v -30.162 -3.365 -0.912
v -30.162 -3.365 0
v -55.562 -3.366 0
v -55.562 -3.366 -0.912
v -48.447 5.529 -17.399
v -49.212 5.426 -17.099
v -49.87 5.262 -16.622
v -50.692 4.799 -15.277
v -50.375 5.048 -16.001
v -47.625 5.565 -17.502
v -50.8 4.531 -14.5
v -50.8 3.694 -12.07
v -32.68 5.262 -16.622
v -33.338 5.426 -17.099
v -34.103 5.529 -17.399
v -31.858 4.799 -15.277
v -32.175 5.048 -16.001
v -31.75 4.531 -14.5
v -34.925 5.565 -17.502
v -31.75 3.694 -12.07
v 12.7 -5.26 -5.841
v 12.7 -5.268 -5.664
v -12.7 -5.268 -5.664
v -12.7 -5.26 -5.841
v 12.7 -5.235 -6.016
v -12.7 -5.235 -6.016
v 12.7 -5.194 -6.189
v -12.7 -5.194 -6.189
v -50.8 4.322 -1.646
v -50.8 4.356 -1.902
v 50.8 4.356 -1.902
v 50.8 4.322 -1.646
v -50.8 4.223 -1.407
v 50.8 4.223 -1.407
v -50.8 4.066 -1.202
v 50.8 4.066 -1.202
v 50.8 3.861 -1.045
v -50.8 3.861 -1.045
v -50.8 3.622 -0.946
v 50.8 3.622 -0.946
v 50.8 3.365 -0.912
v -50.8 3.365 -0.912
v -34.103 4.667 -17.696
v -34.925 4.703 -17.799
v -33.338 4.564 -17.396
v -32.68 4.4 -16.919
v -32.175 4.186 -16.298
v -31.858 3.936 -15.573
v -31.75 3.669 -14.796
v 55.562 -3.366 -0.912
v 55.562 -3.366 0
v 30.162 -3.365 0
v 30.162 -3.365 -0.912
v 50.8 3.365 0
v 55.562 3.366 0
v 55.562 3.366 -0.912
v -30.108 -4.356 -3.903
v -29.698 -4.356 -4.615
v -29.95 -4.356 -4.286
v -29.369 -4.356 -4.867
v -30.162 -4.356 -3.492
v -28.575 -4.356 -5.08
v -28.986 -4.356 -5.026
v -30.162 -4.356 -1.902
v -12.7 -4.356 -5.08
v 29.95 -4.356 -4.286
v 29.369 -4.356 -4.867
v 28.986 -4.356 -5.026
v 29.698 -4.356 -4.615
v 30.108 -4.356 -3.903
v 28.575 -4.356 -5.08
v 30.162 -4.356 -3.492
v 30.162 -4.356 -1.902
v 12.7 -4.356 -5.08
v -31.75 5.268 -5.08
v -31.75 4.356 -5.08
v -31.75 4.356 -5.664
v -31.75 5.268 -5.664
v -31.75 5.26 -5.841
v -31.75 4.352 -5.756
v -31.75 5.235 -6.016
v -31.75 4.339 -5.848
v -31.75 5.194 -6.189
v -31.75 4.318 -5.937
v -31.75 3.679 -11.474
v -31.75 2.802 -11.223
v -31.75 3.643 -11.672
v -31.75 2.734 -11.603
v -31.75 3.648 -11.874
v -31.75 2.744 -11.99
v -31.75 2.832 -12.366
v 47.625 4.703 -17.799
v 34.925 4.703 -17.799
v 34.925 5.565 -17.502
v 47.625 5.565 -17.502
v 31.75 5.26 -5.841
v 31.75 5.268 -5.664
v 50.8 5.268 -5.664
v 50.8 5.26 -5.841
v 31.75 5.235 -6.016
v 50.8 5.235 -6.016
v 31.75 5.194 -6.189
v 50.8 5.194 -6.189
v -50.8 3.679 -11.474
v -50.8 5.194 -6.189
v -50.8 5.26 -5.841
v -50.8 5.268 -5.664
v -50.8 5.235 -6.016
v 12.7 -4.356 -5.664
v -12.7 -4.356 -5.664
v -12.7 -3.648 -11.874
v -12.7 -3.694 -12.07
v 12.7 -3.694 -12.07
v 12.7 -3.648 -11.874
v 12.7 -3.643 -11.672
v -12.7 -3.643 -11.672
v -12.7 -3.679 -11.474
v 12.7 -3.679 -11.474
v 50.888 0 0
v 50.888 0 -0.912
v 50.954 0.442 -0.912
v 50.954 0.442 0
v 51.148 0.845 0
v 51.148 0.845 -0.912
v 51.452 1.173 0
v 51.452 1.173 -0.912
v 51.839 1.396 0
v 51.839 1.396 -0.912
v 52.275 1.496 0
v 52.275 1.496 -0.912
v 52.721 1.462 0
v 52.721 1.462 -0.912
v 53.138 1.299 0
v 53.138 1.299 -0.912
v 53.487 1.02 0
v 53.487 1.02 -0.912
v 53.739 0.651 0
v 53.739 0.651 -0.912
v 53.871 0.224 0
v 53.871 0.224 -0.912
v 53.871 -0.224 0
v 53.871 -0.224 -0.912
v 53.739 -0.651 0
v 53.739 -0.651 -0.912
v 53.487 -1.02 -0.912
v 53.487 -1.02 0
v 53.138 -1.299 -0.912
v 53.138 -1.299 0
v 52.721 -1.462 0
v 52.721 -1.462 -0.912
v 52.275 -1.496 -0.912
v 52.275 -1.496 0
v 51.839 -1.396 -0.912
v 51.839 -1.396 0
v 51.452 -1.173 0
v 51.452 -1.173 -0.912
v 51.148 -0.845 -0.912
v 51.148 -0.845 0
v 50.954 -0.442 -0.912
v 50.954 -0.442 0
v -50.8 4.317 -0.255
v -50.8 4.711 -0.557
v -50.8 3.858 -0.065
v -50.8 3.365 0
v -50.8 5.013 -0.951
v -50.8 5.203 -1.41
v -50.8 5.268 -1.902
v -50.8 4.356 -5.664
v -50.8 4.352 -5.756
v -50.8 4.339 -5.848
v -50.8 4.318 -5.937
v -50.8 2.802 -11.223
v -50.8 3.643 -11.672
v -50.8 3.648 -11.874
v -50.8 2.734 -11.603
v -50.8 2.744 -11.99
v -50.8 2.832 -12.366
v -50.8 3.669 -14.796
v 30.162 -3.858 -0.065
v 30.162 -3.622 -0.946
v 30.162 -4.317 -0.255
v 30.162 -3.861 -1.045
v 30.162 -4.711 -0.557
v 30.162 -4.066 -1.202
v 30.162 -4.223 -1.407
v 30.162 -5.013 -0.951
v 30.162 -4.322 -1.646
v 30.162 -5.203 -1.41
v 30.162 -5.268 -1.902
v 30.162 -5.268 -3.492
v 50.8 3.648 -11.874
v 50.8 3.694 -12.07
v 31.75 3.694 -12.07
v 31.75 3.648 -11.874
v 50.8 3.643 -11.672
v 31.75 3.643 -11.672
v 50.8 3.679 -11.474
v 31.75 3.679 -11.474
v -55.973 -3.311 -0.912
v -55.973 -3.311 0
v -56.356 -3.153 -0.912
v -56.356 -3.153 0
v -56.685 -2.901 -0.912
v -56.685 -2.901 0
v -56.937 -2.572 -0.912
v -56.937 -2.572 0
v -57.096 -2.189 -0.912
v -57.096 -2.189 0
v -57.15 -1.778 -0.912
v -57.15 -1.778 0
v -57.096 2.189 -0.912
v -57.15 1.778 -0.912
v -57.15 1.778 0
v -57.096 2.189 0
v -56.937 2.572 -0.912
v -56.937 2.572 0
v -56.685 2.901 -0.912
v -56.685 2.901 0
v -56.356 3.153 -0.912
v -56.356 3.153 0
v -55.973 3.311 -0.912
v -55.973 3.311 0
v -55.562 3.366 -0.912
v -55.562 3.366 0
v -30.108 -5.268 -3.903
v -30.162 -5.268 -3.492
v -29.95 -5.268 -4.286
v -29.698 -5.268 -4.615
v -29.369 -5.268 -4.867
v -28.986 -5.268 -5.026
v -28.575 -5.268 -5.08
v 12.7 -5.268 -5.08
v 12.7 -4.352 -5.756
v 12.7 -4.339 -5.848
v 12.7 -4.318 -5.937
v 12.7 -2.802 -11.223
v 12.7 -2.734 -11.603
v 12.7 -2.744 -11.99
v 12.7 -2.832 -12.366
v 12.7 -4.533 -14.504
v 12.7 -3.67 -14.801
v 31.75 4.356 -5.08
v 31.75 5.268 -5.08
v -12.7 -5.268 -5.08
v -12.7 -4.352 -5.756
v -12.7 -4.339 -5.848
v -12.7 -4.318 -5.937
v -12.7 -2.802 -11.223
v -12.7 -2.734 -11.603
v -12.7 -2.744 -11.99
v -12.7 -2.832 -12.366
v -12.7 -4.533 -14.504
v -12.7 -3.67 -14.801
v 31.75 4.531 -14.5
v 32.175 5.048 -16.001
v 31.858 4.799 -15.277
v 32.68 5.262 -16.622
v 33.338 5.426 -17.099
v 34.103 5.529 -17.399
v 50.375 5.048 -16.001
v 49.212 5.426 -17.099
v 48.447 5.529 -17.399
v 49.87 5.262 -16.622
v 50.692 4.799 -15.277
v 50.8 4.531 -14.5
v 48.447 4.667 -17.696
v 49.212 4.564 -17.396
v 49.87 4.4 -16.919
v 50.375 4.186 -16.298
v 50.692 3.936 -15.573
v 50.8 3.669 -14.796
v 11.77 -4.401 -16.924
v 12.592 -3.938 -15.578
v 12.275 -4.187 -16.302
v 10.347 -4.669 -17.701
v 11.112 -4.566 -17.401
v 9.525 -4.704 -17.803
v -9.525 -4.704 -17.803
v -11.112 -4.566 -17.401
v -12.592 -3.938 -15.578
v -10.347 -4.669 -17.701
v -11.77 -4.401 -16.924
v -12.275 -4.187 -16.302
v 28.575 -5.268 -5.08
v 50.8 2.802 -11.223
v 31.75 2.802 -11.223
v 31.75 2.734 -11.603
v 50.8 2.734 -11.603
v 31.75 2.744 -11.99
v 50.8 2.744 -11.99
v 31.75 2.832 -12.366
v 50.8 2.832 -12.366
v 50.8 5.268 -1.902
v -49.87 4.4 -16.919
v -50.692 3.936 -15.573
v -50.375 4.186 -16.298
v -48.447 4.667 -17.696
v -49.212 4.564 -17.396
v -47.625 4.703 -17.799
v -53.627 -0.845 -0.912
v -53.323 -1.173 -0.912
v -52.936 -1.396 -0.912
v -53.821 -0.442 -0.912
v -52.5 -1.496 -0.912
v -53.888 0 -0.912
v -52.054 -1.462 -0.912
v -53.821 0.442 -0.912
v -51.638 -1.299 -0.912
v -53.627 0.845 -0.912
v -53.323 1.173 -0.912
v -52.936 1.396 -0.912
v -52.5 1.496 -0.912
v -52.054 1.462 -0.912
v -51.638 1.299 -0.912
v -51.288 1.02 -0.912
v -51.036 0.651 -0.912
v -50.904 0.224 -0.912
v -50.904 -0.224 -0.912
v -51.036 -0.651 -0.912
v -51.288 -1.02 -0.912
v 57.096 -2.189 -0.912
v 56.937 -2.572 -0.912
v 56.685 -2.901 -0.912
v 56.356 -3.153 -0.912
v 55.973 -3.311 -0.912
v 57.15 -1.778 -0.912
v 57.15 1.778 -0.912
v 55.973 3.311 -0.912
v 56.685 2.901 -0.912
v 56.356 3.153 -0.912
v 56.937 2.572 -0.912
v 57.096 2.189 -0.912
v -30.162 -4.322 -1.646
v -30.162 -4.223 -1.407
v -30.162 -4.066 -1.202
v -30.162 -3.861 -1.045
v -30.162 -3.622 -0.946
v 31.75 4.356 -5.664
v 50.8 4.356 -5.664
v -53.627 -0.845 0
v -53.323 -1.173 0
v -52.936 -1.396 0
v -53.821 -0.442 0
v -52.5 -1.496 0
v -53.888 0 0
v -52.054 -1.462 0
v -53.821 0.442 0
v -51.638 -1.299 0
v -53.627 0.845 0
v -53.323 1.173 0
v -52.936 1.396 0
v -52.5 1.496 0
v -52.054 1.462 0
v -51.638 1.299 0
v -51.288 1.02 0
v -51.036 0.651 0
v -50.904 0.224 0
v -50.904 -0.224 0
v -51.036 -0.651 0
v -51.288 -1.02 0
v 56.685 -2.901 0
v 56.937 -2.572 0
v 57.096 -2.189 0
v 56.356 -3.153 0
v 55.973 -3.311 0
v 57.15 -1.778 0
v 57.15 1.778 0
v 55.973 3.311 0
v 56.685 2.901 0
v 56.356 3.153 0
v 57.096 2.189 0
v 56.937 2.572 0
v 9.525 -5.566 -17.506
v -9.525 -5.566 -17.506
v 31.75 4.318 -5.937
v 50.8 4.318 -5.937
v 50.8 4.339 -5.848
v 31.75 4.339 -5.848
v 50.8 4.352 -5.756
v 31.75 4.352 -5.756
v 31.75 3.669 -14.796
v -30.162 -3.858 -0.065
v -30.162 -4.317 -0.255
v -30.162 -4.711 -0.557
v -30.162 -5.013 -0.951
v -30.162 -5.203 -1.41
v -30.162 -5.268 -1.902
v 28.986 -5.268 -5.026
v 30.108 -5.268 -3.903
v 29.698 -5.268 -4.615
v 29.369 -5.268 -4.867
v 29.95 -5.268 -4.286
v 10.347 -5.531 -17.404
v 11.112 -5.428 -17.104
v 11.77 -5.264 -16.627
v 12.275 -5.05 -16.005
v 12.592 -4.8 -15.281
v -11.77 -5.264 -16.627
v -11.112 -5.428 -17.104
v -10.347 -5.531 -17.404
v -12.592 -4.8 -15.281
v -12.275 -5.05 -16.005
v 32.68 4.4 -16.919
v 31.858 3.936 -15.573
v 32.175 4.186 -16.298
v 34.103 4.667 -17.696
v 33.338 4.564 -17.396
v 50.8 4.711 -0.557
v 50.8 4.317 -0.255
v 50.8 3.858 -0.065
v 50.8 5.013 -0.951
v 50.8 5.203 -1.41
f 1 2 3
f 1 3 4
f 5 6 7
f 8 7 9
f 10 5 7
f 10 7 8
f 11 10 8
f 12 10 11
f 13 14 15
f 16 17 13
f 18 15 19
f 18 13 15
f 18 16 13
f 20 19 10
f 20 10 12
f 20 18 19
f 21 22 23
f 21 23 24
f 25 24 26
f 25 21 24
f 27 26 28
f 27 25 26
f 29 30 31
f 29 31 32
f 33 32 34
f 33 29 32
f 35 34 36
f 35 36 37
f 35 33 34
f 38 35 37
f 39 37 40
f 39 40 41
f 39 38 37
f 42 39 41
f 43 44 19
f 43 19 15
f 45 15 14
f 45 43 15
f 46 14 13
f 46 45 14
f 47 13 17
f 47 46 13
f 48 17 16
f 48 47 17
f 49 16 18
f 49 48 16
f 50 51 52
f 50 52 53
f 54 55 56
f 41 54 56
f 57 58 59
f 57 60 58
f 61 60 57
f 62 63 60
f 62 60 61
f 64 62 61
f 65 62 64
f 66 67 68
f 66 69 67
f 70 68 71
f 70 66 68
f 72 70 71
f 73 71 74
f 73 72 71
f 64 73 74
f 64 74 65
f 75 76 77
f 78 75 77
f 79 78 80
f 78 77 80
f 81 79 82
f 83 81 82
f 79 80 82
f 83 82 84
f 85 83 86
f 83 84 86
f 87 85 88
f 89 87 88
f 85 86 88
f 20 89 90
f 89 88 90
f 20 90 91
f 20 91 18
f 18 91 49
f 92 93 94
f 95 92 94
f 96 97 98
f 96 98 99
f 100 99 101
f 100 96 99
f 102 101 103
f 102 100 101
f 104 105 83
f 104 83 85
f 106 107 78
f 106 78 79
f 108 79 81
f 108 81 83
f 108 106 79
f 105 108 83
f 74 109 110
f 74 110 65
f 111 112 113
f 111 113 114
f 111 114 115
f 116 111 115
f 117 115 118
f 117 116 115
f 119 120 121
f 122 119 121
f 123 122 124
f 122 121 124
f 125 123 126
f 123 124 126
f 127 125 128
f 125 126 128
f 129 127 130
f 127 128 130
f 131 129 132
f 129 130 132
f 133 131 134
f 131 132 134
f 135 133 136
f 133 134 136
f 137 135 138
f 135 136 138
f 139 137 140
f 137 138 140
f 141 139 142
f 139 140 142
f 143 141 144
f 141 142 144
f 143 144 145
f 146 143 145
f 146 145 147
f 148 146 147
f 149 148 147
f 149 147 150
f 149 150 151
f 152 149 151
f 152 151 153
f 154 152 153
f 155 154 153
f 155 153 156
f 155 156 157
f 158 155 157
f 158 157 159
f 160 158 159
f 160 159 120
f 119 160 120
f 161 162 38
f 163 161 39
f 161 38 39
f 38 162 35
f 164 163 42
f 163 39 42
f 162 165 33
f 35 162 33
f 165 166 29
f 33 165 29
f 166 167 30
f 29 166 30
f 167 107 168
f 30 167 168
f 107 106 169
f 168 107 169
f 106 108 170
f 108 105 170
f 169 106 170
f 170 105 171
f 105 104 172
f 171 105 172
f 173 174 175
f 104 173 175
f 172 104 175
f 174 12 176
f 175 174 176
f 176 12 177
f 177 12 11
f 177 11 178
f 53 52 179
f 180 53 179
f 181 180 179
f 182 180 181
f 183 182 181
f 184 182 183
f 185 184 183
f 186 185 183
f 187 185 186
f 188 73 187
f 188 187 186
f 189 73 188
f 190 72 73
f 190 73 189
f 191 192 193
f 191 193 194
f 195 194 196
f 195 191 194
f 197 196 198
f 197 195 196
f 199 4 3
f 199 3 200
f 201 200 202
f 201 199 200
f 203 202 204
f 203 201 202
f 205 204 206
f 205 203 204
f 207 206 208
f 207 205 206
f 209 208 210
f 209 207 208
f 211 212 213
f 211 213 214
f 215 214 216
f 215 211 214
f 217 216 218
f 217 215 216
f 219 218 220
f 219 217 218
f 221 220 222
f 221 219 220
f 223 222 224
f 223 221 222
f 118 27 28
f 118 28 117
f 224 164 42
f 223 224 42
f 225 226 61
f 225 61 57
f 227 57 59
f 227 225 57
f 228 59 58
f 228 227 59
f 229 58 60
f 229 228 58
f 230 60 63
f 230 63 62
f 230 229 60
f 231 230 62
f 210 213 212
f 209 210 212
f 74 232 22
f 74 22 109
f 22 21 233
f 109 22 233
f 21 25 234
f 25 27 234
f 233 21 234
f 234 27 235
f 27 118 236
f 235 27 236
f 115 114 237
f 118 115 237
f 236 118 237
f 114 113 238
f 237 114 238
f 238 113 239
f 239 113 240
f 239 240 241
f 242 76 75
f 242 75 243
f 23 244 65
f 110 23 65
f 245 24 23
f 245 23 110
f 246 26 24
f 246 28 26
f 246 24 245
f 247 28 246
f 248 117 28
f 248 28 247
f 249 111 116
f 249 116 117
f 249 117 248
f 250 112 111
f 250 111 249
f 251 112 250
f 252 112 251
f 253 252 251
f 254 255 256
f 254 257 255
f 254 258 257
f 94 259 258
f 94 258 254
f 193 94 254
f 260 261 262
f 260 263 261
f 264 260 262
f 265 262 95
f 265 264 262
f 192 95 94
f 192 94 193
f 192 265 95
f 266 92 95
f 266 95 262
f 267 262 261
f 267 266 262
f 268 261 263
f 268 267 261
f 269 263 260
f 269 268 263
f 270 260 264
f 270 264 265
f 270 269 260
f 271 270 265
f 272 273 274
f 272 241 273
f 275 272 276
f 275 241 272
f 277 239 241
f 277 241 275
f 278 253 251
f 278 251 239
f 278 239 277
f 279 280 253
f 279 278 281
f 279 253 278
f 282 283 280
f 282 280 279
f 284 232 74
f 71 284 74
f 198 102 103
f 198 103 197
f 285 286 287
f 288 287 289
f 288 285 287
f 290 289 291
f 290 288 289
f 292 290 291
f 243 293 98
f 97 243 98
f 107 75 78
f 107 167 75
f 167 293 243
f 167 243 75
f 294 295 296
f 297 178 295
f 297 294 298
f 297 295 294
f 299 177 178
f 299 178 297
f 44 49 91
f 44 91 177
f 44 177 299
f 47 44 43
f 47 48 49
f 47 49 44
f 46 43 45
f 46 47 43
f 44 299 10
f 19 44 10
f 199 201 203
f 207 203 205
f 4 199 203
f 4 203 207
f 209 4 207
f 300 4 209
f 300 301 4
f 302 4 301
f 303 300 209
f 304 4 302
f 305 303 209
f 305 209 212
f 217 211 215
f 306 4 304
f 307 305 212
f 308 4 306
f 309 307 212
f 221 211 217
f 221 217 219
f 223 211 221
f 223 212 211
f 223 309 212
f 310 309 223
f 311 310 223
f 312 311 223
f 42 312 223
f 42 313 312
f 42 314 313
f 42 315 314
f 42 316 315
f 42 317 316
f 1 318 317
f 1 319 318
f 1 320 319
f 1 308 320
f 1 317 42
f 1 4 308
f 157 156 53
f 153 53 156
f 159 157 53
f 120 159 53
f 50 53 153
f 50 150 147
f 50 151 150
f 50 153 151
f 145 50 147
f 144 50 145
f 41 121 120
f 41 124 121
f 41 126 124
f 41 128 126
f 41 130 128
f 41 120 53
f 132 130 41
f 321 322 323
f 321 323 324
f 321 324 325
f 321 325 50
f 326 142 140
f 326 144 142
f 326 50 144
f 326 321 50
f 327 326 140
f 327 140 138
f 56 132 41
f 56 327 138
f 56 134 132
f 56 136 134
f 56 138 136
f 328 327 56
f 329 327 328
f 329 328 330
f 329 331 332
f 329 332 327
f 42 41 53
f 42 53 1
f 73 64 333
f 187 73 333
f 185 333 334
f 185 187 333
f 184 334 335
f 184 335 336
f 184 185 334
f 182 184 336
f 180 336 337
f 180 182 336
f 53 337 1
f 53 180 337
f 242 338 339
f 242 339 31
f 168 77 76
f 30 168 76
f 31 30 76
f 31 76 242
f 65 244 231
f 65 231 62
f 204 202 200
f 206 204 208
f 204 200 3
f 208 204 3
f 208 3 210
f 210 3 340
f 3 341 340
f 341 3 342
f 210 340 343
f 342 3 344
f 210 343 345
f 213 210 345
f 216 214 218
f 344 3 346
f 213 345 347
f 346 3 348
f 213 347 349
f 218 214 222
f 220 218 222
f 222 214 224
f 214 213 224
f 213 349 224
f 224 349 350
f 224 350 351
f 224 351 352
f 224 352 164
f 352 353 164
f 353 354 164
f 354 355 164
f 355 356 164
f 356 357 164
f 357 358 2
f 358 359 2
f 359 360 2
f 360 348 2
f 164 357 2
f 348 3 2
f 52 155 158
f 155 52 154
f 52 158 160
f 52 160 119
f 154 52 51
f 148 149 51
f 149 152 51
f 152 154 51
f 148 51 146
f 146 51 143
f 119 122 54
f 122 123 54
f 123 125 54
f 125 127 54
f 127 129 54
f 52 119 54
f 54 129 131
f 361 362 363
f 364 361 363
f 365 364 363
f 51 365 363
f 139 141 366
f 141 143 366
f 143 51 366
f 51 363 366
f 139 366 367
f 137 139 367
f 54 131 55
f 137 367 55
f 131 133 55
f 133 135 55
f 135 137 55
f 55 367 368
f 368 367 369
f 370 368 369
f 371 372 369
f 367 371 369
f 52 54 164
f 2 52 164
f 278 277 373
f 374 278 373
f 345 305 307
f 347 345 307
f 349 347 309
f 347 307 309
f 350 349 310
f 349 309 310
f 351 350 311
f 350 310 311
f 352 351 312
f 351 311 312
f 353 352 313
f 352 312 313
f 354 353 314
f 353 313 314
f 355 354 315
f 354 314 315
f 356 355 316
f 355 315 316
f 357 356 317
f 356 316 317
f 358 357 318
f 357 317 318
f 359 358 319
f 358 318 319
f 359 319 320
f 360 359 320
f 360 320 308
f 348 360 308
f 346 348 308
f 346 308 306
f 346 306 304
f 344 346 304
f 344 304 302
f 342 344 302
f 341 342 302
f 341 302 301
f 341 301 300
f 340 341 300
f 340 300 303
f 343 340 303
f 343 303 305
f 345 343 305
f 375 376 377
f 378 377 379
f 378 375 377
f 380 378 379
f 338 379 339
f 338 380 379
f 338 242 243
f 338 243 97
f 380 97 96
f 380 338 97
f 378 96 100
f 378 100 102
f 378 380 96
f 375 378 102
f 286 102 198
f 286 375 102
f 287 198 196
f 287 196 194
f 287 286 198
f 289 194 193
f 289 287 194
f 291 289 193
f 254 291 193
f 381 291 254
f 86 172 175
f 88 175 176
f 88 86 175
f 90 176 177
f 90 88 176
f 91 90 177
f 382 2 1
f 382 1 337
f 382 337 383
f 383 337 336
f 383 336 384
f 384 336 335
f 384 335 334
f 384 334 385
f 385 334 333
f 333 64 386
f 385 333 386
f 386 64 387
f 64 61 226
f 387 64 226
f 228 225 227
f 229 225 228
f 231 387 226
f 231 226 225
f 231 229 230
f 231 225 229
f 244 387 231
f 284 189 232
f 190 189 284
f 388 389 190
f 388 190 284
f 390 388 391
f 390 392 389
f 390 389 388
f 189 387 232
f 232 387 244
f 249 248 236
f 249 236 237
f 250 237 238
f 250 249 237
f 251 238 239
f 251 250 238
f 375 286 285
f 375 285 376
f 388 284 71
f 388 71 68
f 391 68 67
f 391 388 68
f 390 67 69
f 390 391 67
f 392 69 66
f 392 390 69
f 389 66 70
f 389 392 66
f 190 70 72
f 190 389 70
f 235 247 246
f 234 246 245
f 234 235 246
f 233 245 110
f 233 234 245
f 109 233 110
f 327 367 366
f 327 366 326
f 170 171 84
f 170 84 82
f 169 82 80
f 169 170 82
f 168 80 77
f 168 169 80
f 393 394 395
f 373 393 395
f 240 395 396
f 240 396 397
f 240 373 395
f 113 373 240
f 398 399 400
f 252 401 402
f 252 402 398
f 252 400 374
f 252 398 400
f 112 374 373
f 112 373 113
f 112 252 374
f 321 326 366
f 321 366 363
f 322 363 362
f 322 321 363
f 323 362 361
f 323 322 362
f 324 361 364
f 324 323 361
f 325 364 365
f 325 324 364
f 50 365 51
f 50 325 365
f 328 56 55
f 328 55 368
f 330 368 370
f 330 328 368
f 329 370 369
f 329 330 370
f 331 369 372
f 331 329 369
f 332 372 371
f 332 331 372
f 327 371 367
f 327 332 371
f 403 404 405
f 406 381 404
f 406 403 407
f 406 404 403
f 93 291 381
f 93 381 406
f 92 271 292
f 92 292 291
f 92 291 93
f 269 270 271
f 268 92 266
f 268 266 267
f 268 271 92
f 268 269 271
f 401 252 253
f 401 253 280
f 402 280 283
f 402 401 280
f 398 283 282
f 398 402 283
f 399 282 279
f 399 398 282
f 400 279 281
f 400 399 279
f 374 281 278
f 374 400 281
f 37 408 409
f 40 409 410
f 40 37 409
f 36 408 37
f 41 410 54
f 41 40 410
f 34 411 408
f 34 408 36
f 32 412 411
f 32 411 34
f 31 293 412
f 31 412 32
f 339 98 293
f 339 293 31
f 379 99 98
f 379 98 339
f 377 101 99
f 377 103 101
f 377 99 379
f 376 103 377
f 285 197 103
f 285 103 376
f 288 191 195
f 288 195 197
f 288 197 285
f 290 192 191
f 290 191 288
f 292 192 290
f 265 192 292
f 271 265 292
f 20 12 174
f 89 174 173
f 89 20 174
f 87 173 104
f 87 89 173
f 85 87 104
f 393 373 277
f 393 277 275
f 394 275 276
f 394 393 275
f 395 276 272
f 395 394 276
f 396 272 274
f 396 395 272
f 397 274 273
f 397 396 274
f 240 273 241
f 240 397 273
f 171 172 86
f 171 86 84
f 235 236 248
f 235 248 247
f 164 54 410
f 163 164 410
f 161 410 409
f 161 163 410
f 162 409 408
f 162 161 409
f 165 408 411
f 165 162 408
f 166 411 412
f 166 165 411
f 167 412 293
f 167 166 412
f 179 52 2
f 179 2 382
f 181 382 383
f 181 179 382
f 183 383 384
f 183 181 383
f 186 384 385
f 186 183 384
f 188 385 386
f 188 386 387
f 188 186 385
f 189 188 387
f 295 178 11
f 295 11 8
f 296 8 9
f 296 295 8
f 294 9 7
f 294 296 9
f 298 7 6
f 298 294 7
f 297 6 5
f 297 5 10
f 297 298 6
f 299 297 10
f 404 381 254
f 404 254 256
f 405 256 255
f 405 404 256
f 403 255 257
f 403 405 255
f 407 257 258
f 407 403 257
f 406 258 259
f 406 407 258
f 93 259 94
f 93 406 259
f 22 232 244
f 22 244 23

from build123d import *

# Parameters (mm, degrees)
SKETCH1_W                                 = 0.91186
SKETCH1_H                                 = 6.731
BASE_FLANGE1_DEPTH                        = 57.15
EDGE_FLANGE1_DEPTH                        = 101.6
EDGE_FLANGE2_DEPTH                        = 101.6
EDGE_FLANGE3_DEPTH                        = 101.6
CUT_EXTRUDE1_START                        = -2.539504
SKETCH21_W                                = 63.5
SKETCH21_H                                = 12.718519465
CUT_EXTRUDE1_DEPTH                        = 2.836243
EDGE_FLANGE4_DEPTH                        = 60.325
EDGE_FLANGE5_DEPTH                        = 25.4
EDGE_FLANGE6_DEPTH                        = 25.4
BREAK_CORNER3_START                       = 0.436452344
BREAK_CORNER3_DEPTH                       = 0.91186
BREAK_CORNER3_START_2                     = -1.348312344
BREAK_CORNER3_2_DEPTH                     = 0.91186
BREAK_CORNER4_START                       = -5.26796
BREAK_CORNER4_DEPTH                       = 0.91186
BREAK_CORNER4_START_2                     = -0.91186
BREAK_CORNER4_2_DEPTH                     = 0.91186
HOLE_FOR_M3_FLUSH_HEAD_STUDS_FH_FHS_FHA_D = 3


# Read off the part's stored shape, not the designer's step: Break-Corner3, Break-Corner4
# Sheet-metal steps are written as plain solids
with BuildPart() as part:
    # Sketch1 → Base-Flange1 (new, symmetric)
    with BuildSketch(Plane(origin=(0, 0, 0), x_dir=(0, 0, -1), z_dir=(1, 0, 0))):
        with Locations((0.45593, 0)):
            Rectangle(SKETCH1_W, SKETCH1_H)
    extrude(amount=BASE_FLANGE1_DEPTH, both=True)

    # Edge-Flange1 section (across the edge) → Edge-Flange1 (add)
    with BuildSketch(Plane(origin=(-50.8, 4.3561, -0.91186), x_dir=(0, -1, 0), z_dir=(1, 0, 0))):
        with BuildLine():
            Line((-0.91186, 0.9906), (-0.91186, 4.75234))
            Line((-0.91186, 4.75234), (0, 4.75234))
            Line((0, 4.75234), (0, 0.9906))
            ThreePointArc((0, 0.9906), (0.290140023, 0.290140023), (0.9906, 0))
            Line((0.9906, 0), (0.9906, -0.91186))
            ThreePointArc((0.9906, -0.91186), (-0.354642367, -0.354642367), (-0.91186, 0.9906))
        make_face()
    extrude(amount=EDGE_FLANGE1_DEPTH)

    # Edge-Flange2 section (across the edge) → Edge-Flange2 (add)
    with BuildSketch(Plane(origin=(-50.8, 4.3561, -5.803419751), x_dir=(0, -0.9612616959383217, 0.27563735581698934), z_dir=(1, 0, 0))):
        with BuildLine():
            Line((-0.91186, 0.139219751), (-0.91186, 5.637646434))
            Line((-0.91186, 5.637646434), (0, 5.637646434))
            Line((0, 5.637646434), (0, 0.139219751))
            ThreePointArc((0, 0.139219751), (0.009640451, 0.001354877), (0.038374164, -0.133826614))
            Line((0.038374164, -0.133826614), (-0.838161926, -0.385169293))
            ThreePointArc((-0.838161926, -0.385169293), (-0.89334539, -0.125551507), (-0.91186, 0.139219751))
        make_face()
    extrude(amount=EDGE_FLANGE2_DEPTH)

    # Edge-Flange3 section (across the edge) → Edge-Flange3 (add)
    with BuildSketch(Plane(origin=(50.8, 3.592598946, -11.774251656), x_dir=(0, 0.9455185755993153, 0.32556815445716125), z_dir=(-1, 0, 0))):
        with BuildLine():
            Line((-0.91186, 0.31233498), (-0.91186, 6.057411646))
            Line((-0.91186, 6.057411646), (0, 6.057411646))
            Line((0, 6.057411646), (0, 0.31233498))
            ThreePointArc((0, 0.31233498), (0.045847989, 0.014455815), (0.179147985, -0.255849838))
            Line((0.179147985, -0.255849838), (-0.567803998, -0.778871247))
            ThreePointArc((-0.567803998, -0.778871247), (-0.82380835, -0.259745775), (-0.91186, 0.31233498))
        make_face()
    extrude(amount=EDGE_FLANGE3_DEPTH)

    # Sketch21 → Cut-Extrude1 (cut)
    with BuildSketch(Plane(origin=(0, 5.26796, 0), x_dir=(1, 0, 0), z_dir=(0, 1, 0)).offset(CUT_EXTRUDE1_START)):
        with Locations((0, 11.439259733)):
            Rectangle(SKETCH21_W, SKETCH21_H)
    extrude(amount=CUT_EXTRUDE1_DEPTH, mode=Mode.SUBTRACT)

    # Edge-Flange4 section (across the edge) → Edge-Flange4 (add)
    with BuildSketch(Plane(origin=(30.1625, -4.3561, -0.91186), x_dir=(0, 1, 0), z_dir=(-1, 0, 0))):
        with BuildLine():
            Line((-0.91186, 0.9906), (-0.91186, 4.16814))
            Line((-0.91186, 4.16814), (0, 4.16814))
            Line((0, 4.16814), (0, 0.9906))
            ThreePointArc((0, 0.9906), (0.290140023, 0.290140023), (0.9906, 0))
            Line((0.9906, 0), (0.9906, -0.91186))
            ThreePointArc((0.9906, -0.91186), (-0.354642367, -0.354642367), (-0.91186, 0.9906))
        make_face()
    extrude(amount=EDGE_FLANGE4_DEPTH)

    # Edge-Flange5 section (across the edge) → Edge-Flange5 (add)
    with BuildSketch(Plane(origin=(12.7, -4.3561, -5.803419751), x_dir=(0, 0.9612616959383217, 0.27563735581698967), z_dir=(-1, 0, 0))):
        with BuildLine():
            Line((-0.91186, 0.139219751), (-0.91186, 5.637646434))
            Line((-0.91186, 5.637646434), (0, 5.637646434))
            Line((0, 5.637646434), (0, 0.139219751))
            ThreePointArc((0, 0.139219751), (0.009640451, 0.001354877), (0.038374164, -0.133826614))
            Line((0.038374164, -0.133826614), (0.199401507, -0.695395697))
            Line((0.199401507, -0.695395697), (-0.677134583, -0.946738376))
            Line((-0.677134583, -0.946738376), (-0.838161926, -0.385169293))
            ThreePointArc((-0.838161926, -0.385169293), (-0.89334539, -0.125551507), (-0.91186, 0.139219751))
        make_face()
    extrude(amount=EDGE_FLANGE5_DEPTH)

    # Edge-Flange6 section (across the edge) → Edge-Flange6 (add)
    with BuildSketch(Plane(origin=(-12.7, -3.592598946, -11.774251656), x_dir=(0, -0.9455185755993154, 0.325568154457161), z_dir=(1, 0, 0))):
        with BuildLine():
            Line((-0.91186, 0.31233498), (-0.91186, 6.062491646))
            Line((-0.91186, 6.062491646), (0, 6.062491646))
            Line((0, 6.062491646), (0, 0.31233498))
            ThreePointArc((0, 0.31233498), (0.045847989, 0.014455815), (0.179147985, -0.255849838))
            Line((0.179147985, -0.255849838), (-0.567803998, -0.778871247))
            ThreePointArc((-0.567803998, -0.778871247), (-0.82380835, -0.259745775), (-0.91186, 0.31233498))
        make_face()
    extrude(amount=EDGE_FLANGE6_DEPTH)

    # Break-Corner3 outline → Break-Corner3 (cut)
    with BuildSketch(Plane(origin=(0, 0, 0), x_dir=(1, 0, 0), z_dir=(0, 0.9455185755993153, -0.3255681544571611)).offset(BREAK_CORNER3_START)):
        with BuildLine():
            Line((12.7, 18.364901109), (9.525, 18.364901109))
            ThreePointArc((9.525, 18.364901109), (11.77006403, 17.434965139), (12.7, 15.189901109))
            Line((12.7, 15.189901109), (12.7, 18.364901109))
        make_face()
        with BuildLine():
            ThreePointArc((-12.7, 15.189901109), (-11.77006403, 17.434965139), (-9.525, 18.364901109))
            Line((-9.525, 18.364901109), (-12.7, 18.364901109))
            Line((-12.7, 18.364901109), (-12.7, 15.189901109))
        make_face()
    extrude(amount=BREAK_CORNER3_DEPTH, mode=Mode.SUBTRACT)

    # Break-Corner3 2 outline → Break-Corner3 2 (cut)
    with BuildSketch(Plane(origin=(0, 0, 0), x_dir=(1, 0, 0), z_dir=(0, 0.9455185755993153, 0.3255681544571611)).offset(BREAK_CORNER3_START_2)):
        with BuildLine():
            ThreePointArc((-50.8, 15.184821109), (-49.87006403, 17.429885139), (-47.625, 18.359821109))
            Line((-47.625, 18.359821109), (-50.8, 18.359821109))
            Line((-50.8, 18.359821109), (-50.8, 15.184821109))
        make_face()
        with BuildLine():
            Line((-31.75, 18.359821109), (-34.925, 18.359821109))
            ThreePointArc((-34.925, 18.359821109), (-32.67993597, 17.429885139), (-31.75, 15.184821109))
            Line((-31.75, 15.184821109), (-31.75, 18.359821109))
        make_face()
        with BuildLine():
            Line((31.75, 18.359821109), (31.75, 15.184821109))
            ThreePointArc((31.75, 15.184821109), (32.67993597, 17.429885139), (34.925, 18.359821109))
            Line((34.925, 18.359821109), (31.75, 18.359821109))
        make_face()
        with BuildLine():
            Line((50.8, 18.359821109), (47.625, 18.359821109))
            ThreePointArc((47.625, 18.359821109), (49.87006403, 17.429885139), (50.8, 15.184821109))
            Line((50.8, 15.184821109), (50.8, 18.359821109))
        make_face()
    extrude(amount=BREAK_CORNER3_2_DEPTH, mode=Mode.SUBTRACT)

    # Break-Corner4 outline → Break-Corner4 (cut)
    with BuildSketch(Plane(origin=(0, 0, 0), x_dir=(1, 0, 0), z_dir=(0, 1, 0)).offset(BREAK_CORNER4_START)):
        with BuildLine():
            ThreePointArc((28.575, 5.08), (29.697532015, 4.615032015), (30.1625, 3.4925))
            Line((30.1625, 3.4925), (30.1625, 5.08))
            Line((30.1625, 5.08), (28.575, 5.08))
        make_face()
        with BuildLine():
            ThreePointArc((-30.1625, 3.4925), (-29.697532015, 4.615032015), (-28.575, 5.08))
            Line((-28.575, 5.08), (-30.1625, 5.08))
            Line((-30.1625, 5.08), (-30.1625, 3.4925))
        make_face()
    extrude(amount=BREAK_CORNER4_DEPTH, mode=Mode.SUBTRACT)

    # Break-Corner4 2 outline → Break-Corner4 2 (cut)
    with BuildSketch(Plane.XY.offset(BREAK_CORNER4_START_2)):
        with BuildLine():
            Line((-57.15, 3.3655), (-57.15, 1.778))
            ThreePointArc((-57.15, 1.778), (-56.685032015, 2.900532015), (-55.5625, 3.3655))
            Line((-55.5625, 3.3655), (-57.15, 3.3655))
        make_face()
        with BuildLine():
            ThreePointArc((-55.5625, -3.3655), (-56.685032015, -2.900532015), (-57.15, -1.778))
            Line((-57.15, -1.778), (-57.15, -3.3655))
            Line((-57.15, -3.3655), (-55.5625, -3.3655))
        make_face()
        with BuildLine():
            Line((57.15, -3.3655), (57.15, -1.778))
            ThreePointArc((57.15, -1.778), (56.685032015, -2.900532015), (55.5625, -3.3655))
            Line((55.5625, -3.3655), (57.15, -3.3655))
        make_face()
        with BuildLine():
            ThreePointArc((55.5625, 3.3655), (56.685032015, 2.900532015), (57.15, 1.778))
            Line((57.15, 1.778), (57.15, 3.3655))
            Line((57.15, 3.3655), (55.5625, 3.3655))
        make_face()
    extrude(amount=BREAK_CORNER4_2_DEPTH, mode=Mode.SUBTRACT)

    # Hole for M3 Flush head Studs (FH,FHS,FHA,FH4)1 (through all)
    with Locations(Plane.XY):
        with Locations((52.3875, 0), (-52.3875, 0)):
            Hole(HOLE_FOR_M3_FLUSH_HEAD_STUDS_FH_FHS_FHA_D / 2)


solid = part.part
